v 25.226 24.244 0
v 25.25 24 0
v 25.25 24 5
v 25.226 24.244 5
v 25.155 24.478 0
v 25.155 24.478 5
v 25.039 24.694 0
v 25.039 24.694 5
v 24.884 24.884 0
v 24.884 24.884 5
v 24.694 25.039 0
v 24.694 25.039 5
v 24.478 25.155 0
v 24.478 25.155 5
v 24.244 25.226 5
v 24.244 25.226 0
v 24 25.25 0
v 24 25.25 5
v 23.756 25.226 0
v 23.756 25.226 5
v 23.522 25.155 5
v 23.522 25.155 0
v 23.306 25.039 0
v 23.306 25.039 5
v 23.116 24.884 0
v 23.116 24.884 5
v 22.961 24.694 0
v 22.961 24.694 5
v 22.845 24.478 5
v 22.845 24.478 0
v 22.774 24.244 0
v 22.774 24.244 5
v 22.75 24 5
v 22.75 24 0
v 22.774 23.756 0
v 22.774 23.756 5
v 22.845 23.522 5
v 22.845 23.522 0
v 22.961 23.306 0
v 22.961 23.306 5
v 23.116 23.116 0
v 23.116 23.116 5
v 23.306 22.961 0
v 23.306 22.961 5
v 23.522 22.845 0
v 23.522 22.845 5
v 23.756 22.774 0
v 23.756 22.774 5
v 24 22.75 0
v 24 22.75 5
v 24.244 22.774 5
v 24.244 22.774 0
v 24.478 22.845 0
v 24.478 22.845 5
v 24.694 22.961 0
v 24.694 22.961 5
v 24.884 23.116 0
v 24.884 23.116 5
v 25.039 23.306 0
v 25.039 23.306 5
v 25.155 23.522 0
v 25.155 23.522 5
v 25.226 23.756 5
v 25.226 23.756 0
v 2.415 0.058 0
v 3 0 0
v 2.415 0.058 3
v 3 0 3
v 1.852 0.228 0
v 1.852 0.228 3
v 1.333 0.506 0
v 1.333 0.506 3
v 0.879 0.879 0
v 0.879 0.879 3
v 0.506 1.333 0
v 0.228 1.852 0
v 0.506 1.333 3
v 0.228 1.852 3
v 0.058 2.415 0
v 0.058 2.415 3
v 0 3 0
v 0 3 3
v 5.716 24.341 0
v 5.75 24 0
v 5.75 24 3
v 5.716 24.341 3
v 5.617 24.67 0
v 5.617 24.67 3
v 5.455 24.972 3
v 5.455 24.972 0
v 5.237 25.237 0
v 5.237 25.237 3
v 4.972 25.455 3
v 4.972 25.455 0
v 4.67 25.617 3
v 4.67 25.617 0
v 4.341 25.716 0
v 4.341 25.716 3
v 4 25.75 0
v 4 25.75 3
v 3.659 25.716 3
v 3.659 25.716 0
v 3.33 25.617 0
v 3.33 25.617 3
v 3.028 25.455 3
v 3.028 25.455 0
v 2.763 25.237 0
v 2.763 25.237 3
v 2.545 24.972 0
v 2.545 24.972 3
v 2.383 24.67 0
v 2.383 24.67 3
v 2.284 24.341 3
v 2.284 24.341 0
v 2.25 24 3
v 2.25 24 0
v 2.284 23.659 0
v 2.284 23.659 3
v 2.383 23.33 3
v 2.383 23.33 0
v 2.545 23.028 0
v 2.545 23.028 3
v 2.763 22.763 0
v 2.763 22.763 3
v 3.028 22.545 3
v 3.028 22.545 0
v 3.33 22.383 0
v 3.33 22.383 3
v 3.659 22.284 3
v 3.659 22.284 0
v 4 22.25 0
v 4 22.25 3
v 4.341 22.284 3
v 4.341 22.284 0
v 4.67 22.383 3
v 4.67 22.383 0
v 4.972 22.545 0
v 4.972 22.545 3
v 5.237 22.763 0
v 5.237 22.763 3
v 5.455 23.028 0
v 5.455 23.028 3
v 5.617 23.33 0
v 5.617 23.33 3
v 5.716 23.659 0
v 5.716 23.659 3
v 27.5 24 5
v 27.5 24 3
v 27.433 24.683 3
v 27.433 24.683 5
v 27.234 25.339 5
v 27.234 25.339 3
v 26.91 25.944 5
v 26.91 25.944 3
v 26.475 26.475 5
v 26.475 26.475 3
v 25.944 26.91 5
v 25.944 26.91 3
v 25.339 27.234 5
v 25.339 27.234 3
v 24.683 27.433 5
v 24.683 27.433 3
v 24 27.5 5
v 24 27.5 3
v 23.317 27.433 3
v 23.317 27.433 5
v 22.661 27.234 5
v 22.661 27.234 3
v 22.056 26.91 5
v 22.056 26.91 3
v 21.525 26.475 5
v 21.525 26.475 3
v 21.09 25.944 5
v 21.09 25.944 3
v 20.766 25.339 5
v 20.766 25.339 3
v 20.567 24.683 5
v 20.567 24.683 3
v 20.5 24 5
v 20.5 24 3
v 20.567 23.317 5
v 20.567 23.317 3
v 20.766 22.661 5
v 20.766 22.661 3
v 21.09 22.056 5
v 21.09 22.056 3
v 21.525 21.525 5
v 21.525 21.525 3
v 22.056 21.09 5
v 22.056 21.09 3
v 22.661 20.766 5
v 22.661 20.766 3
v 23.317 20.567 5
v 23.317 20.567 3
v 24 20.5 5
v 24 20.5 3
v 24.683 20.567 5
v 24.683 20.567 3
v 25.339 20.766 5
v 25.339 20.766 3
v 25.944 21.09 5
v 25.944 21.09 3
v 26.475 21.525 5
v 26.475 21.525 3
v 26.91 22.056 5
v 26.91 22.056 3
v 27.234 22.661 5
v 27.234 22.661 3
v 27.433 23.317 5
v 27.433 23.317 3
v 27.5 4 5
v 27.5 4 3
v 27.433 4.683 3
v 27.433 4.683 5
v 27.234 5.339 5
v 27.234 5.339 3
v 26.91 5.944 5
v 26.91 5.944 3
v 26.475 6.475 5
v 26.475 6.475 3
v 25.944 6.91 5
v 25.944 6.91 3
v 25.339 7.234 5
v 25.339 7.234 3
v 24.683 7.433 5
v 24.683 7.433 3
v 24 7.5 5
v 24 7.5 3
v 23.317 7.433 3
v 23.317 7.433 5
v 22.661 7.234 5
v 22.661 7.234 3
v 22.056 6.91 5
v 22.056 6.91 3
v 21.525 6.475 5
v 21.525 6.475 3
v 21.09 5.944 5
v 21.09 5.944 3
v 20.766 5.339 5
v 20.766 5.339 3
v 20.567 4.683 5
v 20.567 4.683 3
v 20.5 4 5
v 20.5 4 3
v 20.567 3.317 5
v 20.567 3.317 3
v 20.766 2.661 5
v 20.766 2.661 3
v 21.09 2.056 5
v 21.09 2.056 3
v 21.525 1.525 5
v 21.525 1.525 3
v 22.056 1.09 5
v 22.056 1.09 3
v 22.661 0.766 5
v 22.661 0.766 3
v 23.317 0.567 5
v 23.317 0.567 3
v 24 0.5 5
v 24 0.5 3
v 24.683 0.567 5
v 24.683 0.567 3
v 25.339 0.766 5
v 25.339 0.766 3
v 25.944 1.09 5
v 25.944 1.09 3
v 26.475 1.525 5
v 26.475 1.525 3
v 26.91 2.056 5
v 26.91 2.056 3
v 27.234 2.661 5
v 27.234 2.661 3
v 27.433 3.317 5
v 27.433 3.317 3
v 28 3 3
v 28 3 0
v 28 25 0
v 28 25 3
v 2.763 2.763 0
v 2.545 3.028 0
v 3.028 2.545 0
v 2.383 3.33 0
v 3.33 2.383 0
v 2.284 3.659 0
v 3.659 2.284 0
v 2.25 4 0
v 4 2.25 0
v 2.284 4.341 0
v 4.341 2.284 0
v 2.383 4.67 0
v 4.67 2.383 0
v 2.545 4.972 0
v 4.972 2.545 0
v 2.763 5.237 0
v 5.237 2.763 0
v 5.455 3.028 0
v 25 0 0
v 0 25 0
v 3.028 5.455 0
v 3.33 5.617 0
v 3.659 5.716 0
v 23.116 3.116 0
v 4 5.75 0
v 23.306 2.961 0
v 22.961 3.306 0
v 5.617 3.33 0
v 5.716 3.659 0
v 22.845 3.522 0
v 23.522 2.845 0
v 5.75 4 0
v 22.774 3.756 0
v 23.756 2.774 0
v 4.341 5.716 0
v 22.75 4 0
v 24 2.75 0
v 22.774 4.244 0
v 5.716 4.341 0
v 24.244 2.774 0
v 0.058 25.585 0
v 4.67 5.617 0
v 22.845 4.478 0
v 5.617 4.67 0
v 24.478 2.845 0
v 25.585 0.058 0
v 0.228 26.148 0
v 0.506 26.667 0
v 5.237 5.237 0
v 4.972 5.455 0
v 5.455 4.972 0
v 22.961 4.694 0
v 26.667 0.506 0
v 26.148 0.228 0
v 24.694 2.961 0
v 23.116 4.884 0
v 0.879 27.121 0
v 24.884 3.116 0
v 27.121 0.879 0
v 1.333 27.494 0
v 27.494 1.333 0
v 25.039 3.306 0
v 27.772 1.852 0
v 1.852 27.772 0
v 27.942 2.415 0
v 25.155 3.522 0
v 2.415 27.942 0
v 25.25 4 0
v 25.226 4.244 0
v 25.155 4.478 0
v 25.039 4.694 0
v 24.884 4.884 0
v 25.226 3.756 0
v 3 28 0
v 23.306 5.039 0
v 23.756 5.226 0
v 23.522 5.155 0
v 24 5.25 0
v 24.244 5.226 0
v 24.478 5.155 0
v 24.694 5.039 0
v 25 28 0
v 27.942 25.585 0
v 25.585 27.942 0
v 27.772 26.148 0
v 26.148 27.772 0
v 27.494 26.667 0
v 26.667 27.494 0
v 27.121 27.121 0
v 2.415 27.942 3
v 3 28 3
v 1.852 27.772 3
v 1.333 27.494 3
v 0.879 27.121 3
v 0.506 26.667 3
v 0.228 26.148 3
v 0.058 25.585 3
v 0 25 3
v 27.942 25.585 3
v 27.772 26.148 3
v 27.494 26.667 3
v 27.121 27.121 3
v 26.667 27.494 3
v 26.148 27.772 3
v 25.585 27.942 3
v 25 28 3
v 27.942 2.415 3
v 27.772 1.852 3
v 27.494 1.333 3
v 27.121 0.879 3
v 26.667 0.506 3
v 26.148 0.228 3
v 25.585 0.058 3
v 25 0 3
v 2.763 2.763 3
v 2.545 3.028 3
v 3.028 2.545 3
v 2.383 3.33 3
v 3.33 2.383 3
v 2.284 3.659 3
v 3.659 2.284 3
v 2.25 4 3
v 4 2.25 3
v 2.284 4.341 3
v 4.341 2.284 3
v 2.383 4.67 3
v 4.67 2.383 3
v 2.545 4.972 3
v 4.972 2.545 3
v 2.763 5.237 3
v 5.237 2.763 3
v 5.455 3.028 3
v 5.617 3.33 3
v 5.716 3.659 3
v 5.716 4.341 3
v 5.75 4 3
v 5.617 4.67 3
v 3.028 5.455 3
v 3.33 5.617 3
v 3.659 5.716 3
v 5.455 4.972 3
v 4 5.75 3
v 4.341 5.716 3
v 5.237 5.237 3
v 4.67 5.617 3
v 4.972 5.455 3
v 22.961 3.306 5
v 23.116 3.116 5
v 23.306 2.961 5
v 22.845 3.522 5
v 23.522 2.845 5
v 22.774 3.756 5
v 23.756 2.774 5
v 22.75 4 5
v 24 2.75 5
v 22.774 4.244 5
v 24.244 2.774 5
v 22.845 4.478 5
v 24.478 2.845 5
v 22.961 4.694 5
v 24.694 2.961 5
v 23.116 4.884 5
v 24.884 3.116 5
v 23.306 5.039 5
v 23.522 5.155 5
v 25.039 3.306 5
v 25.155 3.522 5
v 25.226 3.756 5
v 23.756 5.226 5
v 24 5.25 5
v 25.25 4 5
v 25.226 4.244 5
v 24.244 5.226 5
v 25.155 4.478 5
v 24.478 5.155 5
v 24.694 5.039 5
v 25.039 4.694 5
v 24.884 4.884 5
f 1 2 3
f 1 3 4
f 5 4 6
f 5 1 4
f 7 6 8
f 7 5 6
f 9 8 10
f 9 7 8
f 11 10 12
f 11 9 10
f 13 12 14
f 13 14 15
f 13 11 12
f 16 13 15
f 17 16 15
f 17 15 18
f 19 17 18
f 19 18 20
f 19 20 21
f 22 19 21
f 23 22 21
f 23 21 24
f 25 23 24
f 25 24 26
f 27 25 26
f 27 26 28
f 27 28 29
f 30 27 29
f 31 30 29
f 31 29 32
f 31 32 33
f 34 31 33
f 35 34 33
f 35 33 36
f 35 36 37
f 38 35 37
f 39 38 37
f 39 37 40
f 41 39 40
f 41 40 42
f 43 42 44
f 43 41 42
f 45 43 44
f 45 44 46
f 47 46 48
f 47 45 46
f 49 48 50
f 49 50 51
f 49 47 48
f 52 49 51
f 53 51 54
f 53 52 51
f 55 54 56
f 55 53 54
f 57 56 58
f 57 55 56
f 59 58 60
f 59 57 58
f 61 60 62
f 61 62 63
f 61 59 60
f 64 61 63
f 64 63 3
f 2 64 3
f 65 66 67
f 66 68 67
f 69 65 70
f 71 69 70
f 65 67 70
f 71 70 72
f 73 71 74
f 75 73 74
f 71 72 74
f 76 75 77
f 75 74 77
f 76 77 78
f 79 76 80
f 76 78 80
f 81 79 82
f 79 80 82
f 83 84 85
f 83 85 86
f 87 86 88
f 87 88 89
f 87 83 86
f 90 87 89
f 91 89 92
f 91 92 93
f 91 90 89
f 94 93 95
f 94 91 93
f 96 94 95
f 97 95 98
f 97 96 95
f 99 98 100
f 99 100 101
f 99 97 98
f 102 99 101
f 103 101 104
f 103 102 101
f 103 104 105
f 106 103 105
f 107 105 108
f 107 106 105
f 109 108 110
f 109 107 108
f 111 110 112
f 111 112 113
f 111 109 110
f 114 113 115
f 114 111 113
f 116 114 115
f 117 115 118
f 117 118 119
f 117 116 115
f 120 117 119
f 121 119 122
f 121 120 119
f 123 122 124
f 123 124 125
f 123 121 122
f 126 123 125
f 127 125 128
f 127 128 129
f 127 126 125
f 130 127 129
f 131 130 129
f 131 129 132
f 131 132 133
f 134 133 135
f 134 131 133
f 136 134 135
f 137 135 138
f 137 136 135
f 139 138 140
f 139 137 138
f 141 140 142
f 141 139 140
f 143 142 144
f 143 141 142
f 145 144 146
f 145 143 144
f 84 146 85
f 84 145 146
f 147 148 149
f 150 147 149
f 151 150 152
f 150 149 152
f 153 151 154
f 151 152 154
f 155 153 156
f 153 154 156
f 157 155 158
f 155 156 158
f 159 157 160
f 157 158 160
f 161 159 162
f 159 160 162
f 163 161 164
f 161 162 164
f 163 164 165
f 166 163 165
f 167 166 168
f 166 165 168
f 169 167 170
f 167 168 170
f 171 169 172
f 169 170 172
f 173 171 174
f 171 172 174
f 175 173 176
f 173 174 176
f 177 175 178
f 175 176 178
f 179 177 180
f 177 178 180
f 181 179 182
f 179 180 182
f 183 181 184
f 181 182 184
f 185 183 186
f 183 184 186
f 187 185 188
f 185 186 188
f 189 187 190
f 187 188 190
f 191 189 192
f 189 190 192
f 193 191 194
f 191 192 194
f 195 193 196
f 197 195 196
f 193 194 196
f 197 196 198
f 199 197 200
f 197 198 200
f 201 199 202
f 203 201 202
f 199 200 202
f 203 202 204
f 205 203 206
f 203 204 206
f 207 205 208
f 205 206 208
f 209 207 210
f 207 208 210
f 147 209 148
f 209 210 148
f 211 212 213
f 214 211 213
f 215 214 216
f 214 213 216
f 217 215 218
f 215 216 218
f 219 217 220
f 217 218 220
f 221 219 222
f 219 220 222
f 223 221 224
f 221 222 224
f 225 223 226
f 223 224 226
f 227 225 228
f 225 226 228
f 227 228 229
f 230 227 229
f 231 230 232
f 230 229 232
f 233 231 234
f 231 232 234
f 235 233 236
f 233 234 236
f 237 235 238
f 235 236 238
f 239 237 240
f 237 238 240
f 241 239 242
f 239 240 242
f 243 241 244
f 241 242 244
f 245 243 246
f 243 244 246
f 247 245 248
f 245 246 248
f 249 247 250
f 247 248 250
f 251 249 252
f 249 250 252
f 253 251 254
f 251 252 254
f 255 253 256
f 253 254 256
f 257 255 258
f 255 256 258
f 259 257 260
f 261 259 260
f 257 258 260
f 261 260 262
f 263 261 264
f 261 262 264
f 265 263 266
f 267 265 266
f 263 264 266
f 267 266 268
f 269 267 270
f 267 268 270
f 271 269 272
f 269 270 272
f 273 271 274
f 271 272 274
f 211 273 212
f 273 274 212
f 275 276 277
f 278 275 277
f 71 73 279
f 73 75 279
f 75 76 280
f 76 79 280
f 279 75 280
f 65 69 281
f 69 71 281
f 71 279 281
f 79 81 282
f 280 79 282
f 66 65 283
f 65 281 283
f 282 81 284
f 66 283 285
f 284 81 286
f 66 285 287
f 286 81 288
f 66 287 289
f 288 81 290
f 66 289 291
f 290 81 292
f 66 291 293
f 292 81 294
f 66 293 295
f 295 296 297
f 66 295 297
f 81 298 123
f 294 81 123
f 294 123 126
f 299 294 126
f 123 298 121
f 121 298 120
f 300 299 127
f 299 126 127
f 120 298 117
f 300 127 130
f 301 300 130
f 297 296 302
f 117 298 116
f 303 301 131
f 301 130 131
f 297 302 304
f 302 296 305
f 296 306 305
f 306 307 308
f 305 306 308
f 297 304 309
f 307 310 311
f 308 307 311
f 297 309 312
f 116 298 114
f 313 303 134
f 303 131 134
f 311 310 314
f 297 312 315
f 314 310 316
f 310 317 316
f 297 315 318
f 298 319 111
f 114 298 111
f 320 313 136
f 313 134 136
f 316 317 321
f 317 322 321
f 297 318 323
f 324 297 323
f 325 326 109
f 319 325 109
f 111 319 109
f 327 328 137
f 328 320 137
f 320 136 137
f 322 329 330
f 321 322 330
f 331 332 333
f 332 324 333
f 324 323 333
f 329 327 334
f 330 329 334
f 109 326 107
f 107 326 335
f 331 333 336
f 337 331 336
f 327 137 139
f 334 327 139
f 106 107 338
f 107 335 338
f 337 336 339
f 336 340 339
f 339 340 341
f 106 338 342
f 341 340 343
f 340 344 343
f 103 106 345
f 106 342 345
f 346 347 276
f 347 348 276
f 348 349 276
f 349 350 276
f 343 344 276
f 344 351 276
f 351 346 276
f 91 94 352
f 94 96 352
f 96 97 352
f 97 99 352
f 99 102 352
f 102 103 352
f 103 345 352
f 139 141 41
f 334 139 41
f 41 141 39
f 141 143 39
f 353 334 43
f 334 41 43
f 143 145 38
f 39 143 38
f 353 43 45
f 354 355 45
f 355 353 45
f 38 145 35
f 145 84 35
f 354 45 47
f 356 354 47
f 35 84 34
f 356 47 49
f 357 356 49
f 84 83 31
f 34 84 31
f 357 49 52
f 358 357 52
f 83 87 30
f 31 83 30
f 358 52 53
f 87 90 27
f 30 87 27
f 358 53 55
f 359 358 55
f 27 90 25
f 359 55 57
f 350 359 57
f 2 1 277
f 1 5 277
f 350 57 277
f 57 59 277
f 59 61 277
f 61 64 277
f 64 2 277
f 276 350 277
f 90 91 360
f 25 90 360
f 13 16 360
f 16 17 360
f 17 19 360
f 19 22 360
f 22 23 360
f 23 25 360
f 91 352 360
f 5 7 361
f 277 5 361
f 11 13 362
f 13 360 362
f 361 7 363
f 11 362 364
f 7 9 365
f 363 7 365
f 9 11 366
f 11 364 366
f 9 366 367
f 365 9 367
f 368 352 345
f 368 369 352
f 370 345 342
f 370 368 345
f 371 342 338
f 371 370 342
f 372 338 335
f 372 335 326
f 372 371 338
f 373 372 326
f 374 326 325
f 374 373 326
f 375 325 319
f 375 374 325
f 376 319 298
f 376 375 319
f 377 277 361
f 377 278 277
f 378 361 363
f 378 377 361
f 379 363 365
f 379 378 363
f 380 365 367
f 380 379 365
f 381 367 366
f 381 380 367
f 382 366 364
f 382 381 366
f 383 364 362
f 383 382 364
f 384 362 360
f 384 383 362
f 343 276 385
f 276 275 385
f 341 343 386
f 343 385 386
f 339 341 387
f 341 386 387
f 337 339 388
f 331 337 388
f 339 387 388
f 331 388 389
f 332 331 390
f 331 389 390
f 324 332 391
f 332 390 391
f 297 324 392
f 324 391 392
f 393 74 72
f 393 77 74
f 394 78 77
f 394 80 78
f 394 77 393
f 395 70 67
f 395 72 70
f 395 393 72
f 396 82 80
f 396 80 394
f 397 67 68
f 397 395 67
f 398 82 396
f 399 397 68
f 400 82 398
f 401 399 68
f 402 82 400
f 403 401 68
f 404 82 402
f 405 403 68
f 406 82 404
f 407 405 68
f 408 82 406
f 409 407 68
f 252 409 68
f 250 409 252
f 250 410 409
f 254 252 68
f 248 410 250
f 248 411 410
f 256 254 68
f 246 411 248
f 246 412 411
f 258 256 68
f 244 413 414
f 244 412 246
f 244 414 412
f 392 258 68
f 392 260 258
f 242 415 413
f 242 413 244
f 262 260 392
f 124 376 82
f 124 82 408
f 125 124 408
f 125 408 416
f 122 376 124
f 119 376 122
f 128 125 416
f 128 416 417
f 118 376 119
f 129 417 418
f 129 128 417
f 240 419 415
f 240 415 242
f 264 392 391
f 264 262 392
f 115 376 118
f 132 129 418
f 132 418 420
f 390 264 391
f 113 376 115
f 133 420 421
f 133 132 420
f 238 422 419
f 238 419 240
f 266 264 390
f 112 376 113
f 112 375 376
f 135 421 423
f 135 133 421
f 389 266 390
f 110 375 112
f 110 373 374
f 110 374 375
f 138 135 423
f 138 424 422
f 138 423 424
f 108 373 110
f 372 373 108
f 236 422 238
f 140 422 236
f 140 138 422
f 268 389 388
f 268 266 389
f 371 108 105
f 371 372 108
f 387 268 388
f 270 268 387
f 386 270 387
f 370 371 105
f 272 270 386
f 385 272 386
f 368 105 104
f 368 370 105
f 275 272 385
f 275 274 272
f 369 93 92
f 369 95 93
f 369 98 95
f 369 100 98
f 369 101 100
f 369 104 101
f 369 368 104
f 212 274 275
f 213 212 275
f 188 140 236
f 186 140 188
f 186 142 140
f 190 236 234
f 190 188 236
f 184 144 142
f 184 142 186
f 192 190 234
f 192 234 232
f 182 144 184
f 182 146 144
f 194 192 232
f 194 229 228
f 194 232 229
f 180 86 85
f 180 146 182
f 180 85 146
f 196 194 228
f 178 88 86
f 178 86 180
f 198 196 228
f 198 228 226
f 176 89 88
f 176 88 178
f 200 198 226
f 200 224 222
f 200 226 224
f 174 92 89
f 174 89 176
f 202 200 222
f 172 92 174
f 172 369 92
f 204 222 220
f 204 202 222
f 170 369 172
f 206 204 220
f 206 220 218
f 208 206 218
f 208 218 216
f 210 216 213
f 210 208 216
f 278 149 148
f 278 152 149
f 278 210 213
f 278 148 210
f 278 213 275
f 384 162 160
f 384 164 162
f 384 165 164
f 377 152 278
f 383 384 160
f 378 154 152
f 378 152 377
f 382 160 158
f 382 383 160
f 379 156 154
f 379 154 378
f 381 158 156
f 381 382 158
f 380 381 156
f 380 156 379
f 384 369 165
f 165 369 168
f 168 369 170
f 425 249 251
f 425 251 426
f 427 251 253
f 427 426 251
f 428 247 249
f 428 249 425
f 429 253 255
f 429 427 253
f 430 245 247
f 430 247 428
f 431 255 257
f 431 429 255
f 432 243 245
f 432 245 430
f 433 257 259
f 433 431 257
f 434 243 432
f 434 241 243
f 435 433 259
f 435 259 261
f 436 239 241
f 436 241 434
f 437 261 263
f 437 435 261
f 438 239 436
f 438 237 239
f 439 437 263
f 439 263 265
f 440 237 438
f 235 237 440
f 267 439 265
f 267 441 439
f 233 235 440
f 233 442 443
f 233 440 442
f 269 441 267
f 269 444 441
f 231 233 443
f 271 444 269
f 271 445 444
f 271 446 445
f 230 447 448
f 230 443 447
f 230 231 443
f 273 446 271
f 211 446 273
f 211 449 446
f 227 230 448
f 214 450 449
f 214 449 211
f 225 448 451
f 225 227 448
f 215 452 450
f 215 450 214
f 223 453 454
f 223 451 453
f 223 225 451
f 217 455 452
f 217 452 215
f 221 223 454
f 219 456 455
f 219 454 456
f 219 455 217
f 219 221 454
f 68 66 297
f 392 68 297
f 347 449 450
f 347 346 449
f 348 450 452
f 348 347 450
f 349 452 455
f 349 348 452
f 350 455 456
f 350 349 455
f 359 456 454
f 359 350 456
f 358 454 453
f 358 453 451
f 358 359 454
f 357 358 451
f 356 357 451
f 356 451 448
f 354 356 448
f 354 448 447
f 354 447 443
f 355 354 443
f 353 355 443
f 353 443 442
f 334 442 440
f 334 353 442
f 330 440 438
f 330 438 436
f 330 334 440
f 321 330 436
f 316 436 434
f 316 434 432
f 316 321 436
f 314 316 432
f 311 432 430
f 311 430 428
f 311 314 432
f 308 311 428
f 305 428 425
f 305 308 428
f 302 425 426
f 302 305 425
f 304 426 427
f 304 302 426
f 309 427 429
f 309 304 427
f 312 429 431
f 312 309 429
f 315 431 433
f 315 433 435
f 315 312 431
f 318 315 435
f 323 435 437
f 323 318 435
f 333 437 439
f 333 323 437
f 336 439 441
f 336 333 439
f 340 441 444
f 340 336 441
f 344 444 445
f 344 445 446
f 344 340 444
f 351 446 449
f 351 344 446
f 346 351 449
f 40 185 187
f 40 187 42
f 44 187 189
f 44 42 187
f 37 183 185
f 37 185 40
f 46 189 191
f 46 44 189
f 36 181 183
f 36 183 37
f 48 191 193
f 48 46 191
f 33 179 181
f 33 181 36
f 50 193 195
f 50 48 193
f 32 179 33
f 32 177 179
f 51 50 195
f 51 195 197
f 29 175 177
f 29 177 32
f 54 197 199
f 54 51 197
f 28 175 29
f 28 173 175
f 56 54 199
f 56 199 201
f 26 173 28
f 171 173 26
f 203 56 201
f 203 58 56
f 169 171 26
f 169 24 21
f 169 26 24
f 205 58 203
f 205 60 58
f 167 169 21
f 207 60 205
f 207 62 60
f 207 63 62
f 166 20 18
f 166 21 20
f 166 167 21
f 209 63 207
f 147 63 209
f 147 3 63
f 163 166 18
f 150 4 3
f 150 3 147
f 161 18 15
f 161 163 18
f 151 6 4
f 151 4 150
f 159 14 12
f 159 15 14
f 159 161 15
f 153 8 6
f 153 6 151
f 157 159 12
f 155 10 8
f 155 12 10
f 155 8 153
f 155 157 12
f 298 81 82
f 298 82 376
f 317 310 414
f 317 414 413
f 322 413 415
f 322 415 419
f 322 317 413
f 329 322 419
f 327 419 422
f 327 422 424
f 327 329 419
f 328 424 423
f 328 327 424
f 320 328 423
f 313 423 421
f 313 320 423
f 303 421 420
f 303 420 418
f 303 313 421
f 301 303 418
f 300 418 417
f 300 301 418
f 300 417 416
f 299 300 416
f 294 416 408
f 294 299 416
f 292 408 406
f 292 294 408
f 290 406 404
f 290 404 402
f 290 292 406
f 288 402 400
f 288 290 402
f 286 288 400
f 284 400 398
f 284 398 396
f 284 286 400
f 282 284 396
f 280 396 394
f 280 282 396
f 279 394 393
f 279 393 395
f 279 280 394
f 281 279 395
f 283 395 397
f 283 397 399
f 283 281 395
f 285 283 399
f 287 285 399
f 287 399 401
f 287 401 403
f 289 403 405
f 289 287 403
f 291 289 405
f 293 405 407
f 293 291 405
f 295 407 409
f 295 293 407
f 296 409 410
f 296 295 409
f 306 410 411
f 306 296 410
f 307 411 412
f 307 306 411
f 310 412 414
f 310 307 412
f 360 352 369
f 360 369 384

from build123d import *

# Parameters (mm, degrees)
SKETCH_W      = 28
SKETCH_H      = 28
SKETCH_R      = 1.75
SKETCH_R_2    = 1.25
PAD_DEPTH     = 3
SKETCH001_R   = 3.5
SKETCH001_R_2 = 1.25
PAD001_DEPTH  = 2
FILLET_R      = 3


with BuildPart() as part:
    # Sketch → Pad (new body)
    with BuildSketch(Plane.XY):
        with Locations((14, 14)):
            Rectangle(SKETCH_W, SKETCH_H)
        with Locations((4, 24)):
            Circle(SKETCH_R, mode=Mode.SUBTRACT)
        with Locations((24, 24)):
            Circle(SKETCH_R_2, mode=Mode.SUBTRACT)
        with Locations((24, 4)):
            Circle(SKETCH_R_2, mode=Mode.SUBTRACT)
        with Locations((4, 4)):
            Circle(SKETCH_R, mode=Mode.SUBTRACT)
    extrude(amount=PAD_DEPTH)

    # Sketch001 (on Face10 of Pad) → Pad001 (join)
    with BuildSketch(Plane.XY.offset(3)):
        with Locations((24, 4)):
            Circle(SKETCH001_R)
        with Locations((24, 4)):
            Circle(SKETCH001_R_2, mode=Mode.SUBTRACT)
        with Locations((24, 24)):
            Circle(SKETCH001_R)
        with Locations((24, 24)):
            Circle(SKETCH001_R_2, mode=Mode.SUBTRACT)
    extrude(amount=PAD001_DEPTH)

    # Fillet
    fillet_edges = [part.edges().sort_by_distance(p)[0] for p in [
        (0, 0, 1.5),
        (0, 28, 1.5),
        (28, 0, 1.5),
        (28, 28, 1.5),
    ]]
    fillet(fillet_edges, radius=FILLET_R)


solid = part.part
